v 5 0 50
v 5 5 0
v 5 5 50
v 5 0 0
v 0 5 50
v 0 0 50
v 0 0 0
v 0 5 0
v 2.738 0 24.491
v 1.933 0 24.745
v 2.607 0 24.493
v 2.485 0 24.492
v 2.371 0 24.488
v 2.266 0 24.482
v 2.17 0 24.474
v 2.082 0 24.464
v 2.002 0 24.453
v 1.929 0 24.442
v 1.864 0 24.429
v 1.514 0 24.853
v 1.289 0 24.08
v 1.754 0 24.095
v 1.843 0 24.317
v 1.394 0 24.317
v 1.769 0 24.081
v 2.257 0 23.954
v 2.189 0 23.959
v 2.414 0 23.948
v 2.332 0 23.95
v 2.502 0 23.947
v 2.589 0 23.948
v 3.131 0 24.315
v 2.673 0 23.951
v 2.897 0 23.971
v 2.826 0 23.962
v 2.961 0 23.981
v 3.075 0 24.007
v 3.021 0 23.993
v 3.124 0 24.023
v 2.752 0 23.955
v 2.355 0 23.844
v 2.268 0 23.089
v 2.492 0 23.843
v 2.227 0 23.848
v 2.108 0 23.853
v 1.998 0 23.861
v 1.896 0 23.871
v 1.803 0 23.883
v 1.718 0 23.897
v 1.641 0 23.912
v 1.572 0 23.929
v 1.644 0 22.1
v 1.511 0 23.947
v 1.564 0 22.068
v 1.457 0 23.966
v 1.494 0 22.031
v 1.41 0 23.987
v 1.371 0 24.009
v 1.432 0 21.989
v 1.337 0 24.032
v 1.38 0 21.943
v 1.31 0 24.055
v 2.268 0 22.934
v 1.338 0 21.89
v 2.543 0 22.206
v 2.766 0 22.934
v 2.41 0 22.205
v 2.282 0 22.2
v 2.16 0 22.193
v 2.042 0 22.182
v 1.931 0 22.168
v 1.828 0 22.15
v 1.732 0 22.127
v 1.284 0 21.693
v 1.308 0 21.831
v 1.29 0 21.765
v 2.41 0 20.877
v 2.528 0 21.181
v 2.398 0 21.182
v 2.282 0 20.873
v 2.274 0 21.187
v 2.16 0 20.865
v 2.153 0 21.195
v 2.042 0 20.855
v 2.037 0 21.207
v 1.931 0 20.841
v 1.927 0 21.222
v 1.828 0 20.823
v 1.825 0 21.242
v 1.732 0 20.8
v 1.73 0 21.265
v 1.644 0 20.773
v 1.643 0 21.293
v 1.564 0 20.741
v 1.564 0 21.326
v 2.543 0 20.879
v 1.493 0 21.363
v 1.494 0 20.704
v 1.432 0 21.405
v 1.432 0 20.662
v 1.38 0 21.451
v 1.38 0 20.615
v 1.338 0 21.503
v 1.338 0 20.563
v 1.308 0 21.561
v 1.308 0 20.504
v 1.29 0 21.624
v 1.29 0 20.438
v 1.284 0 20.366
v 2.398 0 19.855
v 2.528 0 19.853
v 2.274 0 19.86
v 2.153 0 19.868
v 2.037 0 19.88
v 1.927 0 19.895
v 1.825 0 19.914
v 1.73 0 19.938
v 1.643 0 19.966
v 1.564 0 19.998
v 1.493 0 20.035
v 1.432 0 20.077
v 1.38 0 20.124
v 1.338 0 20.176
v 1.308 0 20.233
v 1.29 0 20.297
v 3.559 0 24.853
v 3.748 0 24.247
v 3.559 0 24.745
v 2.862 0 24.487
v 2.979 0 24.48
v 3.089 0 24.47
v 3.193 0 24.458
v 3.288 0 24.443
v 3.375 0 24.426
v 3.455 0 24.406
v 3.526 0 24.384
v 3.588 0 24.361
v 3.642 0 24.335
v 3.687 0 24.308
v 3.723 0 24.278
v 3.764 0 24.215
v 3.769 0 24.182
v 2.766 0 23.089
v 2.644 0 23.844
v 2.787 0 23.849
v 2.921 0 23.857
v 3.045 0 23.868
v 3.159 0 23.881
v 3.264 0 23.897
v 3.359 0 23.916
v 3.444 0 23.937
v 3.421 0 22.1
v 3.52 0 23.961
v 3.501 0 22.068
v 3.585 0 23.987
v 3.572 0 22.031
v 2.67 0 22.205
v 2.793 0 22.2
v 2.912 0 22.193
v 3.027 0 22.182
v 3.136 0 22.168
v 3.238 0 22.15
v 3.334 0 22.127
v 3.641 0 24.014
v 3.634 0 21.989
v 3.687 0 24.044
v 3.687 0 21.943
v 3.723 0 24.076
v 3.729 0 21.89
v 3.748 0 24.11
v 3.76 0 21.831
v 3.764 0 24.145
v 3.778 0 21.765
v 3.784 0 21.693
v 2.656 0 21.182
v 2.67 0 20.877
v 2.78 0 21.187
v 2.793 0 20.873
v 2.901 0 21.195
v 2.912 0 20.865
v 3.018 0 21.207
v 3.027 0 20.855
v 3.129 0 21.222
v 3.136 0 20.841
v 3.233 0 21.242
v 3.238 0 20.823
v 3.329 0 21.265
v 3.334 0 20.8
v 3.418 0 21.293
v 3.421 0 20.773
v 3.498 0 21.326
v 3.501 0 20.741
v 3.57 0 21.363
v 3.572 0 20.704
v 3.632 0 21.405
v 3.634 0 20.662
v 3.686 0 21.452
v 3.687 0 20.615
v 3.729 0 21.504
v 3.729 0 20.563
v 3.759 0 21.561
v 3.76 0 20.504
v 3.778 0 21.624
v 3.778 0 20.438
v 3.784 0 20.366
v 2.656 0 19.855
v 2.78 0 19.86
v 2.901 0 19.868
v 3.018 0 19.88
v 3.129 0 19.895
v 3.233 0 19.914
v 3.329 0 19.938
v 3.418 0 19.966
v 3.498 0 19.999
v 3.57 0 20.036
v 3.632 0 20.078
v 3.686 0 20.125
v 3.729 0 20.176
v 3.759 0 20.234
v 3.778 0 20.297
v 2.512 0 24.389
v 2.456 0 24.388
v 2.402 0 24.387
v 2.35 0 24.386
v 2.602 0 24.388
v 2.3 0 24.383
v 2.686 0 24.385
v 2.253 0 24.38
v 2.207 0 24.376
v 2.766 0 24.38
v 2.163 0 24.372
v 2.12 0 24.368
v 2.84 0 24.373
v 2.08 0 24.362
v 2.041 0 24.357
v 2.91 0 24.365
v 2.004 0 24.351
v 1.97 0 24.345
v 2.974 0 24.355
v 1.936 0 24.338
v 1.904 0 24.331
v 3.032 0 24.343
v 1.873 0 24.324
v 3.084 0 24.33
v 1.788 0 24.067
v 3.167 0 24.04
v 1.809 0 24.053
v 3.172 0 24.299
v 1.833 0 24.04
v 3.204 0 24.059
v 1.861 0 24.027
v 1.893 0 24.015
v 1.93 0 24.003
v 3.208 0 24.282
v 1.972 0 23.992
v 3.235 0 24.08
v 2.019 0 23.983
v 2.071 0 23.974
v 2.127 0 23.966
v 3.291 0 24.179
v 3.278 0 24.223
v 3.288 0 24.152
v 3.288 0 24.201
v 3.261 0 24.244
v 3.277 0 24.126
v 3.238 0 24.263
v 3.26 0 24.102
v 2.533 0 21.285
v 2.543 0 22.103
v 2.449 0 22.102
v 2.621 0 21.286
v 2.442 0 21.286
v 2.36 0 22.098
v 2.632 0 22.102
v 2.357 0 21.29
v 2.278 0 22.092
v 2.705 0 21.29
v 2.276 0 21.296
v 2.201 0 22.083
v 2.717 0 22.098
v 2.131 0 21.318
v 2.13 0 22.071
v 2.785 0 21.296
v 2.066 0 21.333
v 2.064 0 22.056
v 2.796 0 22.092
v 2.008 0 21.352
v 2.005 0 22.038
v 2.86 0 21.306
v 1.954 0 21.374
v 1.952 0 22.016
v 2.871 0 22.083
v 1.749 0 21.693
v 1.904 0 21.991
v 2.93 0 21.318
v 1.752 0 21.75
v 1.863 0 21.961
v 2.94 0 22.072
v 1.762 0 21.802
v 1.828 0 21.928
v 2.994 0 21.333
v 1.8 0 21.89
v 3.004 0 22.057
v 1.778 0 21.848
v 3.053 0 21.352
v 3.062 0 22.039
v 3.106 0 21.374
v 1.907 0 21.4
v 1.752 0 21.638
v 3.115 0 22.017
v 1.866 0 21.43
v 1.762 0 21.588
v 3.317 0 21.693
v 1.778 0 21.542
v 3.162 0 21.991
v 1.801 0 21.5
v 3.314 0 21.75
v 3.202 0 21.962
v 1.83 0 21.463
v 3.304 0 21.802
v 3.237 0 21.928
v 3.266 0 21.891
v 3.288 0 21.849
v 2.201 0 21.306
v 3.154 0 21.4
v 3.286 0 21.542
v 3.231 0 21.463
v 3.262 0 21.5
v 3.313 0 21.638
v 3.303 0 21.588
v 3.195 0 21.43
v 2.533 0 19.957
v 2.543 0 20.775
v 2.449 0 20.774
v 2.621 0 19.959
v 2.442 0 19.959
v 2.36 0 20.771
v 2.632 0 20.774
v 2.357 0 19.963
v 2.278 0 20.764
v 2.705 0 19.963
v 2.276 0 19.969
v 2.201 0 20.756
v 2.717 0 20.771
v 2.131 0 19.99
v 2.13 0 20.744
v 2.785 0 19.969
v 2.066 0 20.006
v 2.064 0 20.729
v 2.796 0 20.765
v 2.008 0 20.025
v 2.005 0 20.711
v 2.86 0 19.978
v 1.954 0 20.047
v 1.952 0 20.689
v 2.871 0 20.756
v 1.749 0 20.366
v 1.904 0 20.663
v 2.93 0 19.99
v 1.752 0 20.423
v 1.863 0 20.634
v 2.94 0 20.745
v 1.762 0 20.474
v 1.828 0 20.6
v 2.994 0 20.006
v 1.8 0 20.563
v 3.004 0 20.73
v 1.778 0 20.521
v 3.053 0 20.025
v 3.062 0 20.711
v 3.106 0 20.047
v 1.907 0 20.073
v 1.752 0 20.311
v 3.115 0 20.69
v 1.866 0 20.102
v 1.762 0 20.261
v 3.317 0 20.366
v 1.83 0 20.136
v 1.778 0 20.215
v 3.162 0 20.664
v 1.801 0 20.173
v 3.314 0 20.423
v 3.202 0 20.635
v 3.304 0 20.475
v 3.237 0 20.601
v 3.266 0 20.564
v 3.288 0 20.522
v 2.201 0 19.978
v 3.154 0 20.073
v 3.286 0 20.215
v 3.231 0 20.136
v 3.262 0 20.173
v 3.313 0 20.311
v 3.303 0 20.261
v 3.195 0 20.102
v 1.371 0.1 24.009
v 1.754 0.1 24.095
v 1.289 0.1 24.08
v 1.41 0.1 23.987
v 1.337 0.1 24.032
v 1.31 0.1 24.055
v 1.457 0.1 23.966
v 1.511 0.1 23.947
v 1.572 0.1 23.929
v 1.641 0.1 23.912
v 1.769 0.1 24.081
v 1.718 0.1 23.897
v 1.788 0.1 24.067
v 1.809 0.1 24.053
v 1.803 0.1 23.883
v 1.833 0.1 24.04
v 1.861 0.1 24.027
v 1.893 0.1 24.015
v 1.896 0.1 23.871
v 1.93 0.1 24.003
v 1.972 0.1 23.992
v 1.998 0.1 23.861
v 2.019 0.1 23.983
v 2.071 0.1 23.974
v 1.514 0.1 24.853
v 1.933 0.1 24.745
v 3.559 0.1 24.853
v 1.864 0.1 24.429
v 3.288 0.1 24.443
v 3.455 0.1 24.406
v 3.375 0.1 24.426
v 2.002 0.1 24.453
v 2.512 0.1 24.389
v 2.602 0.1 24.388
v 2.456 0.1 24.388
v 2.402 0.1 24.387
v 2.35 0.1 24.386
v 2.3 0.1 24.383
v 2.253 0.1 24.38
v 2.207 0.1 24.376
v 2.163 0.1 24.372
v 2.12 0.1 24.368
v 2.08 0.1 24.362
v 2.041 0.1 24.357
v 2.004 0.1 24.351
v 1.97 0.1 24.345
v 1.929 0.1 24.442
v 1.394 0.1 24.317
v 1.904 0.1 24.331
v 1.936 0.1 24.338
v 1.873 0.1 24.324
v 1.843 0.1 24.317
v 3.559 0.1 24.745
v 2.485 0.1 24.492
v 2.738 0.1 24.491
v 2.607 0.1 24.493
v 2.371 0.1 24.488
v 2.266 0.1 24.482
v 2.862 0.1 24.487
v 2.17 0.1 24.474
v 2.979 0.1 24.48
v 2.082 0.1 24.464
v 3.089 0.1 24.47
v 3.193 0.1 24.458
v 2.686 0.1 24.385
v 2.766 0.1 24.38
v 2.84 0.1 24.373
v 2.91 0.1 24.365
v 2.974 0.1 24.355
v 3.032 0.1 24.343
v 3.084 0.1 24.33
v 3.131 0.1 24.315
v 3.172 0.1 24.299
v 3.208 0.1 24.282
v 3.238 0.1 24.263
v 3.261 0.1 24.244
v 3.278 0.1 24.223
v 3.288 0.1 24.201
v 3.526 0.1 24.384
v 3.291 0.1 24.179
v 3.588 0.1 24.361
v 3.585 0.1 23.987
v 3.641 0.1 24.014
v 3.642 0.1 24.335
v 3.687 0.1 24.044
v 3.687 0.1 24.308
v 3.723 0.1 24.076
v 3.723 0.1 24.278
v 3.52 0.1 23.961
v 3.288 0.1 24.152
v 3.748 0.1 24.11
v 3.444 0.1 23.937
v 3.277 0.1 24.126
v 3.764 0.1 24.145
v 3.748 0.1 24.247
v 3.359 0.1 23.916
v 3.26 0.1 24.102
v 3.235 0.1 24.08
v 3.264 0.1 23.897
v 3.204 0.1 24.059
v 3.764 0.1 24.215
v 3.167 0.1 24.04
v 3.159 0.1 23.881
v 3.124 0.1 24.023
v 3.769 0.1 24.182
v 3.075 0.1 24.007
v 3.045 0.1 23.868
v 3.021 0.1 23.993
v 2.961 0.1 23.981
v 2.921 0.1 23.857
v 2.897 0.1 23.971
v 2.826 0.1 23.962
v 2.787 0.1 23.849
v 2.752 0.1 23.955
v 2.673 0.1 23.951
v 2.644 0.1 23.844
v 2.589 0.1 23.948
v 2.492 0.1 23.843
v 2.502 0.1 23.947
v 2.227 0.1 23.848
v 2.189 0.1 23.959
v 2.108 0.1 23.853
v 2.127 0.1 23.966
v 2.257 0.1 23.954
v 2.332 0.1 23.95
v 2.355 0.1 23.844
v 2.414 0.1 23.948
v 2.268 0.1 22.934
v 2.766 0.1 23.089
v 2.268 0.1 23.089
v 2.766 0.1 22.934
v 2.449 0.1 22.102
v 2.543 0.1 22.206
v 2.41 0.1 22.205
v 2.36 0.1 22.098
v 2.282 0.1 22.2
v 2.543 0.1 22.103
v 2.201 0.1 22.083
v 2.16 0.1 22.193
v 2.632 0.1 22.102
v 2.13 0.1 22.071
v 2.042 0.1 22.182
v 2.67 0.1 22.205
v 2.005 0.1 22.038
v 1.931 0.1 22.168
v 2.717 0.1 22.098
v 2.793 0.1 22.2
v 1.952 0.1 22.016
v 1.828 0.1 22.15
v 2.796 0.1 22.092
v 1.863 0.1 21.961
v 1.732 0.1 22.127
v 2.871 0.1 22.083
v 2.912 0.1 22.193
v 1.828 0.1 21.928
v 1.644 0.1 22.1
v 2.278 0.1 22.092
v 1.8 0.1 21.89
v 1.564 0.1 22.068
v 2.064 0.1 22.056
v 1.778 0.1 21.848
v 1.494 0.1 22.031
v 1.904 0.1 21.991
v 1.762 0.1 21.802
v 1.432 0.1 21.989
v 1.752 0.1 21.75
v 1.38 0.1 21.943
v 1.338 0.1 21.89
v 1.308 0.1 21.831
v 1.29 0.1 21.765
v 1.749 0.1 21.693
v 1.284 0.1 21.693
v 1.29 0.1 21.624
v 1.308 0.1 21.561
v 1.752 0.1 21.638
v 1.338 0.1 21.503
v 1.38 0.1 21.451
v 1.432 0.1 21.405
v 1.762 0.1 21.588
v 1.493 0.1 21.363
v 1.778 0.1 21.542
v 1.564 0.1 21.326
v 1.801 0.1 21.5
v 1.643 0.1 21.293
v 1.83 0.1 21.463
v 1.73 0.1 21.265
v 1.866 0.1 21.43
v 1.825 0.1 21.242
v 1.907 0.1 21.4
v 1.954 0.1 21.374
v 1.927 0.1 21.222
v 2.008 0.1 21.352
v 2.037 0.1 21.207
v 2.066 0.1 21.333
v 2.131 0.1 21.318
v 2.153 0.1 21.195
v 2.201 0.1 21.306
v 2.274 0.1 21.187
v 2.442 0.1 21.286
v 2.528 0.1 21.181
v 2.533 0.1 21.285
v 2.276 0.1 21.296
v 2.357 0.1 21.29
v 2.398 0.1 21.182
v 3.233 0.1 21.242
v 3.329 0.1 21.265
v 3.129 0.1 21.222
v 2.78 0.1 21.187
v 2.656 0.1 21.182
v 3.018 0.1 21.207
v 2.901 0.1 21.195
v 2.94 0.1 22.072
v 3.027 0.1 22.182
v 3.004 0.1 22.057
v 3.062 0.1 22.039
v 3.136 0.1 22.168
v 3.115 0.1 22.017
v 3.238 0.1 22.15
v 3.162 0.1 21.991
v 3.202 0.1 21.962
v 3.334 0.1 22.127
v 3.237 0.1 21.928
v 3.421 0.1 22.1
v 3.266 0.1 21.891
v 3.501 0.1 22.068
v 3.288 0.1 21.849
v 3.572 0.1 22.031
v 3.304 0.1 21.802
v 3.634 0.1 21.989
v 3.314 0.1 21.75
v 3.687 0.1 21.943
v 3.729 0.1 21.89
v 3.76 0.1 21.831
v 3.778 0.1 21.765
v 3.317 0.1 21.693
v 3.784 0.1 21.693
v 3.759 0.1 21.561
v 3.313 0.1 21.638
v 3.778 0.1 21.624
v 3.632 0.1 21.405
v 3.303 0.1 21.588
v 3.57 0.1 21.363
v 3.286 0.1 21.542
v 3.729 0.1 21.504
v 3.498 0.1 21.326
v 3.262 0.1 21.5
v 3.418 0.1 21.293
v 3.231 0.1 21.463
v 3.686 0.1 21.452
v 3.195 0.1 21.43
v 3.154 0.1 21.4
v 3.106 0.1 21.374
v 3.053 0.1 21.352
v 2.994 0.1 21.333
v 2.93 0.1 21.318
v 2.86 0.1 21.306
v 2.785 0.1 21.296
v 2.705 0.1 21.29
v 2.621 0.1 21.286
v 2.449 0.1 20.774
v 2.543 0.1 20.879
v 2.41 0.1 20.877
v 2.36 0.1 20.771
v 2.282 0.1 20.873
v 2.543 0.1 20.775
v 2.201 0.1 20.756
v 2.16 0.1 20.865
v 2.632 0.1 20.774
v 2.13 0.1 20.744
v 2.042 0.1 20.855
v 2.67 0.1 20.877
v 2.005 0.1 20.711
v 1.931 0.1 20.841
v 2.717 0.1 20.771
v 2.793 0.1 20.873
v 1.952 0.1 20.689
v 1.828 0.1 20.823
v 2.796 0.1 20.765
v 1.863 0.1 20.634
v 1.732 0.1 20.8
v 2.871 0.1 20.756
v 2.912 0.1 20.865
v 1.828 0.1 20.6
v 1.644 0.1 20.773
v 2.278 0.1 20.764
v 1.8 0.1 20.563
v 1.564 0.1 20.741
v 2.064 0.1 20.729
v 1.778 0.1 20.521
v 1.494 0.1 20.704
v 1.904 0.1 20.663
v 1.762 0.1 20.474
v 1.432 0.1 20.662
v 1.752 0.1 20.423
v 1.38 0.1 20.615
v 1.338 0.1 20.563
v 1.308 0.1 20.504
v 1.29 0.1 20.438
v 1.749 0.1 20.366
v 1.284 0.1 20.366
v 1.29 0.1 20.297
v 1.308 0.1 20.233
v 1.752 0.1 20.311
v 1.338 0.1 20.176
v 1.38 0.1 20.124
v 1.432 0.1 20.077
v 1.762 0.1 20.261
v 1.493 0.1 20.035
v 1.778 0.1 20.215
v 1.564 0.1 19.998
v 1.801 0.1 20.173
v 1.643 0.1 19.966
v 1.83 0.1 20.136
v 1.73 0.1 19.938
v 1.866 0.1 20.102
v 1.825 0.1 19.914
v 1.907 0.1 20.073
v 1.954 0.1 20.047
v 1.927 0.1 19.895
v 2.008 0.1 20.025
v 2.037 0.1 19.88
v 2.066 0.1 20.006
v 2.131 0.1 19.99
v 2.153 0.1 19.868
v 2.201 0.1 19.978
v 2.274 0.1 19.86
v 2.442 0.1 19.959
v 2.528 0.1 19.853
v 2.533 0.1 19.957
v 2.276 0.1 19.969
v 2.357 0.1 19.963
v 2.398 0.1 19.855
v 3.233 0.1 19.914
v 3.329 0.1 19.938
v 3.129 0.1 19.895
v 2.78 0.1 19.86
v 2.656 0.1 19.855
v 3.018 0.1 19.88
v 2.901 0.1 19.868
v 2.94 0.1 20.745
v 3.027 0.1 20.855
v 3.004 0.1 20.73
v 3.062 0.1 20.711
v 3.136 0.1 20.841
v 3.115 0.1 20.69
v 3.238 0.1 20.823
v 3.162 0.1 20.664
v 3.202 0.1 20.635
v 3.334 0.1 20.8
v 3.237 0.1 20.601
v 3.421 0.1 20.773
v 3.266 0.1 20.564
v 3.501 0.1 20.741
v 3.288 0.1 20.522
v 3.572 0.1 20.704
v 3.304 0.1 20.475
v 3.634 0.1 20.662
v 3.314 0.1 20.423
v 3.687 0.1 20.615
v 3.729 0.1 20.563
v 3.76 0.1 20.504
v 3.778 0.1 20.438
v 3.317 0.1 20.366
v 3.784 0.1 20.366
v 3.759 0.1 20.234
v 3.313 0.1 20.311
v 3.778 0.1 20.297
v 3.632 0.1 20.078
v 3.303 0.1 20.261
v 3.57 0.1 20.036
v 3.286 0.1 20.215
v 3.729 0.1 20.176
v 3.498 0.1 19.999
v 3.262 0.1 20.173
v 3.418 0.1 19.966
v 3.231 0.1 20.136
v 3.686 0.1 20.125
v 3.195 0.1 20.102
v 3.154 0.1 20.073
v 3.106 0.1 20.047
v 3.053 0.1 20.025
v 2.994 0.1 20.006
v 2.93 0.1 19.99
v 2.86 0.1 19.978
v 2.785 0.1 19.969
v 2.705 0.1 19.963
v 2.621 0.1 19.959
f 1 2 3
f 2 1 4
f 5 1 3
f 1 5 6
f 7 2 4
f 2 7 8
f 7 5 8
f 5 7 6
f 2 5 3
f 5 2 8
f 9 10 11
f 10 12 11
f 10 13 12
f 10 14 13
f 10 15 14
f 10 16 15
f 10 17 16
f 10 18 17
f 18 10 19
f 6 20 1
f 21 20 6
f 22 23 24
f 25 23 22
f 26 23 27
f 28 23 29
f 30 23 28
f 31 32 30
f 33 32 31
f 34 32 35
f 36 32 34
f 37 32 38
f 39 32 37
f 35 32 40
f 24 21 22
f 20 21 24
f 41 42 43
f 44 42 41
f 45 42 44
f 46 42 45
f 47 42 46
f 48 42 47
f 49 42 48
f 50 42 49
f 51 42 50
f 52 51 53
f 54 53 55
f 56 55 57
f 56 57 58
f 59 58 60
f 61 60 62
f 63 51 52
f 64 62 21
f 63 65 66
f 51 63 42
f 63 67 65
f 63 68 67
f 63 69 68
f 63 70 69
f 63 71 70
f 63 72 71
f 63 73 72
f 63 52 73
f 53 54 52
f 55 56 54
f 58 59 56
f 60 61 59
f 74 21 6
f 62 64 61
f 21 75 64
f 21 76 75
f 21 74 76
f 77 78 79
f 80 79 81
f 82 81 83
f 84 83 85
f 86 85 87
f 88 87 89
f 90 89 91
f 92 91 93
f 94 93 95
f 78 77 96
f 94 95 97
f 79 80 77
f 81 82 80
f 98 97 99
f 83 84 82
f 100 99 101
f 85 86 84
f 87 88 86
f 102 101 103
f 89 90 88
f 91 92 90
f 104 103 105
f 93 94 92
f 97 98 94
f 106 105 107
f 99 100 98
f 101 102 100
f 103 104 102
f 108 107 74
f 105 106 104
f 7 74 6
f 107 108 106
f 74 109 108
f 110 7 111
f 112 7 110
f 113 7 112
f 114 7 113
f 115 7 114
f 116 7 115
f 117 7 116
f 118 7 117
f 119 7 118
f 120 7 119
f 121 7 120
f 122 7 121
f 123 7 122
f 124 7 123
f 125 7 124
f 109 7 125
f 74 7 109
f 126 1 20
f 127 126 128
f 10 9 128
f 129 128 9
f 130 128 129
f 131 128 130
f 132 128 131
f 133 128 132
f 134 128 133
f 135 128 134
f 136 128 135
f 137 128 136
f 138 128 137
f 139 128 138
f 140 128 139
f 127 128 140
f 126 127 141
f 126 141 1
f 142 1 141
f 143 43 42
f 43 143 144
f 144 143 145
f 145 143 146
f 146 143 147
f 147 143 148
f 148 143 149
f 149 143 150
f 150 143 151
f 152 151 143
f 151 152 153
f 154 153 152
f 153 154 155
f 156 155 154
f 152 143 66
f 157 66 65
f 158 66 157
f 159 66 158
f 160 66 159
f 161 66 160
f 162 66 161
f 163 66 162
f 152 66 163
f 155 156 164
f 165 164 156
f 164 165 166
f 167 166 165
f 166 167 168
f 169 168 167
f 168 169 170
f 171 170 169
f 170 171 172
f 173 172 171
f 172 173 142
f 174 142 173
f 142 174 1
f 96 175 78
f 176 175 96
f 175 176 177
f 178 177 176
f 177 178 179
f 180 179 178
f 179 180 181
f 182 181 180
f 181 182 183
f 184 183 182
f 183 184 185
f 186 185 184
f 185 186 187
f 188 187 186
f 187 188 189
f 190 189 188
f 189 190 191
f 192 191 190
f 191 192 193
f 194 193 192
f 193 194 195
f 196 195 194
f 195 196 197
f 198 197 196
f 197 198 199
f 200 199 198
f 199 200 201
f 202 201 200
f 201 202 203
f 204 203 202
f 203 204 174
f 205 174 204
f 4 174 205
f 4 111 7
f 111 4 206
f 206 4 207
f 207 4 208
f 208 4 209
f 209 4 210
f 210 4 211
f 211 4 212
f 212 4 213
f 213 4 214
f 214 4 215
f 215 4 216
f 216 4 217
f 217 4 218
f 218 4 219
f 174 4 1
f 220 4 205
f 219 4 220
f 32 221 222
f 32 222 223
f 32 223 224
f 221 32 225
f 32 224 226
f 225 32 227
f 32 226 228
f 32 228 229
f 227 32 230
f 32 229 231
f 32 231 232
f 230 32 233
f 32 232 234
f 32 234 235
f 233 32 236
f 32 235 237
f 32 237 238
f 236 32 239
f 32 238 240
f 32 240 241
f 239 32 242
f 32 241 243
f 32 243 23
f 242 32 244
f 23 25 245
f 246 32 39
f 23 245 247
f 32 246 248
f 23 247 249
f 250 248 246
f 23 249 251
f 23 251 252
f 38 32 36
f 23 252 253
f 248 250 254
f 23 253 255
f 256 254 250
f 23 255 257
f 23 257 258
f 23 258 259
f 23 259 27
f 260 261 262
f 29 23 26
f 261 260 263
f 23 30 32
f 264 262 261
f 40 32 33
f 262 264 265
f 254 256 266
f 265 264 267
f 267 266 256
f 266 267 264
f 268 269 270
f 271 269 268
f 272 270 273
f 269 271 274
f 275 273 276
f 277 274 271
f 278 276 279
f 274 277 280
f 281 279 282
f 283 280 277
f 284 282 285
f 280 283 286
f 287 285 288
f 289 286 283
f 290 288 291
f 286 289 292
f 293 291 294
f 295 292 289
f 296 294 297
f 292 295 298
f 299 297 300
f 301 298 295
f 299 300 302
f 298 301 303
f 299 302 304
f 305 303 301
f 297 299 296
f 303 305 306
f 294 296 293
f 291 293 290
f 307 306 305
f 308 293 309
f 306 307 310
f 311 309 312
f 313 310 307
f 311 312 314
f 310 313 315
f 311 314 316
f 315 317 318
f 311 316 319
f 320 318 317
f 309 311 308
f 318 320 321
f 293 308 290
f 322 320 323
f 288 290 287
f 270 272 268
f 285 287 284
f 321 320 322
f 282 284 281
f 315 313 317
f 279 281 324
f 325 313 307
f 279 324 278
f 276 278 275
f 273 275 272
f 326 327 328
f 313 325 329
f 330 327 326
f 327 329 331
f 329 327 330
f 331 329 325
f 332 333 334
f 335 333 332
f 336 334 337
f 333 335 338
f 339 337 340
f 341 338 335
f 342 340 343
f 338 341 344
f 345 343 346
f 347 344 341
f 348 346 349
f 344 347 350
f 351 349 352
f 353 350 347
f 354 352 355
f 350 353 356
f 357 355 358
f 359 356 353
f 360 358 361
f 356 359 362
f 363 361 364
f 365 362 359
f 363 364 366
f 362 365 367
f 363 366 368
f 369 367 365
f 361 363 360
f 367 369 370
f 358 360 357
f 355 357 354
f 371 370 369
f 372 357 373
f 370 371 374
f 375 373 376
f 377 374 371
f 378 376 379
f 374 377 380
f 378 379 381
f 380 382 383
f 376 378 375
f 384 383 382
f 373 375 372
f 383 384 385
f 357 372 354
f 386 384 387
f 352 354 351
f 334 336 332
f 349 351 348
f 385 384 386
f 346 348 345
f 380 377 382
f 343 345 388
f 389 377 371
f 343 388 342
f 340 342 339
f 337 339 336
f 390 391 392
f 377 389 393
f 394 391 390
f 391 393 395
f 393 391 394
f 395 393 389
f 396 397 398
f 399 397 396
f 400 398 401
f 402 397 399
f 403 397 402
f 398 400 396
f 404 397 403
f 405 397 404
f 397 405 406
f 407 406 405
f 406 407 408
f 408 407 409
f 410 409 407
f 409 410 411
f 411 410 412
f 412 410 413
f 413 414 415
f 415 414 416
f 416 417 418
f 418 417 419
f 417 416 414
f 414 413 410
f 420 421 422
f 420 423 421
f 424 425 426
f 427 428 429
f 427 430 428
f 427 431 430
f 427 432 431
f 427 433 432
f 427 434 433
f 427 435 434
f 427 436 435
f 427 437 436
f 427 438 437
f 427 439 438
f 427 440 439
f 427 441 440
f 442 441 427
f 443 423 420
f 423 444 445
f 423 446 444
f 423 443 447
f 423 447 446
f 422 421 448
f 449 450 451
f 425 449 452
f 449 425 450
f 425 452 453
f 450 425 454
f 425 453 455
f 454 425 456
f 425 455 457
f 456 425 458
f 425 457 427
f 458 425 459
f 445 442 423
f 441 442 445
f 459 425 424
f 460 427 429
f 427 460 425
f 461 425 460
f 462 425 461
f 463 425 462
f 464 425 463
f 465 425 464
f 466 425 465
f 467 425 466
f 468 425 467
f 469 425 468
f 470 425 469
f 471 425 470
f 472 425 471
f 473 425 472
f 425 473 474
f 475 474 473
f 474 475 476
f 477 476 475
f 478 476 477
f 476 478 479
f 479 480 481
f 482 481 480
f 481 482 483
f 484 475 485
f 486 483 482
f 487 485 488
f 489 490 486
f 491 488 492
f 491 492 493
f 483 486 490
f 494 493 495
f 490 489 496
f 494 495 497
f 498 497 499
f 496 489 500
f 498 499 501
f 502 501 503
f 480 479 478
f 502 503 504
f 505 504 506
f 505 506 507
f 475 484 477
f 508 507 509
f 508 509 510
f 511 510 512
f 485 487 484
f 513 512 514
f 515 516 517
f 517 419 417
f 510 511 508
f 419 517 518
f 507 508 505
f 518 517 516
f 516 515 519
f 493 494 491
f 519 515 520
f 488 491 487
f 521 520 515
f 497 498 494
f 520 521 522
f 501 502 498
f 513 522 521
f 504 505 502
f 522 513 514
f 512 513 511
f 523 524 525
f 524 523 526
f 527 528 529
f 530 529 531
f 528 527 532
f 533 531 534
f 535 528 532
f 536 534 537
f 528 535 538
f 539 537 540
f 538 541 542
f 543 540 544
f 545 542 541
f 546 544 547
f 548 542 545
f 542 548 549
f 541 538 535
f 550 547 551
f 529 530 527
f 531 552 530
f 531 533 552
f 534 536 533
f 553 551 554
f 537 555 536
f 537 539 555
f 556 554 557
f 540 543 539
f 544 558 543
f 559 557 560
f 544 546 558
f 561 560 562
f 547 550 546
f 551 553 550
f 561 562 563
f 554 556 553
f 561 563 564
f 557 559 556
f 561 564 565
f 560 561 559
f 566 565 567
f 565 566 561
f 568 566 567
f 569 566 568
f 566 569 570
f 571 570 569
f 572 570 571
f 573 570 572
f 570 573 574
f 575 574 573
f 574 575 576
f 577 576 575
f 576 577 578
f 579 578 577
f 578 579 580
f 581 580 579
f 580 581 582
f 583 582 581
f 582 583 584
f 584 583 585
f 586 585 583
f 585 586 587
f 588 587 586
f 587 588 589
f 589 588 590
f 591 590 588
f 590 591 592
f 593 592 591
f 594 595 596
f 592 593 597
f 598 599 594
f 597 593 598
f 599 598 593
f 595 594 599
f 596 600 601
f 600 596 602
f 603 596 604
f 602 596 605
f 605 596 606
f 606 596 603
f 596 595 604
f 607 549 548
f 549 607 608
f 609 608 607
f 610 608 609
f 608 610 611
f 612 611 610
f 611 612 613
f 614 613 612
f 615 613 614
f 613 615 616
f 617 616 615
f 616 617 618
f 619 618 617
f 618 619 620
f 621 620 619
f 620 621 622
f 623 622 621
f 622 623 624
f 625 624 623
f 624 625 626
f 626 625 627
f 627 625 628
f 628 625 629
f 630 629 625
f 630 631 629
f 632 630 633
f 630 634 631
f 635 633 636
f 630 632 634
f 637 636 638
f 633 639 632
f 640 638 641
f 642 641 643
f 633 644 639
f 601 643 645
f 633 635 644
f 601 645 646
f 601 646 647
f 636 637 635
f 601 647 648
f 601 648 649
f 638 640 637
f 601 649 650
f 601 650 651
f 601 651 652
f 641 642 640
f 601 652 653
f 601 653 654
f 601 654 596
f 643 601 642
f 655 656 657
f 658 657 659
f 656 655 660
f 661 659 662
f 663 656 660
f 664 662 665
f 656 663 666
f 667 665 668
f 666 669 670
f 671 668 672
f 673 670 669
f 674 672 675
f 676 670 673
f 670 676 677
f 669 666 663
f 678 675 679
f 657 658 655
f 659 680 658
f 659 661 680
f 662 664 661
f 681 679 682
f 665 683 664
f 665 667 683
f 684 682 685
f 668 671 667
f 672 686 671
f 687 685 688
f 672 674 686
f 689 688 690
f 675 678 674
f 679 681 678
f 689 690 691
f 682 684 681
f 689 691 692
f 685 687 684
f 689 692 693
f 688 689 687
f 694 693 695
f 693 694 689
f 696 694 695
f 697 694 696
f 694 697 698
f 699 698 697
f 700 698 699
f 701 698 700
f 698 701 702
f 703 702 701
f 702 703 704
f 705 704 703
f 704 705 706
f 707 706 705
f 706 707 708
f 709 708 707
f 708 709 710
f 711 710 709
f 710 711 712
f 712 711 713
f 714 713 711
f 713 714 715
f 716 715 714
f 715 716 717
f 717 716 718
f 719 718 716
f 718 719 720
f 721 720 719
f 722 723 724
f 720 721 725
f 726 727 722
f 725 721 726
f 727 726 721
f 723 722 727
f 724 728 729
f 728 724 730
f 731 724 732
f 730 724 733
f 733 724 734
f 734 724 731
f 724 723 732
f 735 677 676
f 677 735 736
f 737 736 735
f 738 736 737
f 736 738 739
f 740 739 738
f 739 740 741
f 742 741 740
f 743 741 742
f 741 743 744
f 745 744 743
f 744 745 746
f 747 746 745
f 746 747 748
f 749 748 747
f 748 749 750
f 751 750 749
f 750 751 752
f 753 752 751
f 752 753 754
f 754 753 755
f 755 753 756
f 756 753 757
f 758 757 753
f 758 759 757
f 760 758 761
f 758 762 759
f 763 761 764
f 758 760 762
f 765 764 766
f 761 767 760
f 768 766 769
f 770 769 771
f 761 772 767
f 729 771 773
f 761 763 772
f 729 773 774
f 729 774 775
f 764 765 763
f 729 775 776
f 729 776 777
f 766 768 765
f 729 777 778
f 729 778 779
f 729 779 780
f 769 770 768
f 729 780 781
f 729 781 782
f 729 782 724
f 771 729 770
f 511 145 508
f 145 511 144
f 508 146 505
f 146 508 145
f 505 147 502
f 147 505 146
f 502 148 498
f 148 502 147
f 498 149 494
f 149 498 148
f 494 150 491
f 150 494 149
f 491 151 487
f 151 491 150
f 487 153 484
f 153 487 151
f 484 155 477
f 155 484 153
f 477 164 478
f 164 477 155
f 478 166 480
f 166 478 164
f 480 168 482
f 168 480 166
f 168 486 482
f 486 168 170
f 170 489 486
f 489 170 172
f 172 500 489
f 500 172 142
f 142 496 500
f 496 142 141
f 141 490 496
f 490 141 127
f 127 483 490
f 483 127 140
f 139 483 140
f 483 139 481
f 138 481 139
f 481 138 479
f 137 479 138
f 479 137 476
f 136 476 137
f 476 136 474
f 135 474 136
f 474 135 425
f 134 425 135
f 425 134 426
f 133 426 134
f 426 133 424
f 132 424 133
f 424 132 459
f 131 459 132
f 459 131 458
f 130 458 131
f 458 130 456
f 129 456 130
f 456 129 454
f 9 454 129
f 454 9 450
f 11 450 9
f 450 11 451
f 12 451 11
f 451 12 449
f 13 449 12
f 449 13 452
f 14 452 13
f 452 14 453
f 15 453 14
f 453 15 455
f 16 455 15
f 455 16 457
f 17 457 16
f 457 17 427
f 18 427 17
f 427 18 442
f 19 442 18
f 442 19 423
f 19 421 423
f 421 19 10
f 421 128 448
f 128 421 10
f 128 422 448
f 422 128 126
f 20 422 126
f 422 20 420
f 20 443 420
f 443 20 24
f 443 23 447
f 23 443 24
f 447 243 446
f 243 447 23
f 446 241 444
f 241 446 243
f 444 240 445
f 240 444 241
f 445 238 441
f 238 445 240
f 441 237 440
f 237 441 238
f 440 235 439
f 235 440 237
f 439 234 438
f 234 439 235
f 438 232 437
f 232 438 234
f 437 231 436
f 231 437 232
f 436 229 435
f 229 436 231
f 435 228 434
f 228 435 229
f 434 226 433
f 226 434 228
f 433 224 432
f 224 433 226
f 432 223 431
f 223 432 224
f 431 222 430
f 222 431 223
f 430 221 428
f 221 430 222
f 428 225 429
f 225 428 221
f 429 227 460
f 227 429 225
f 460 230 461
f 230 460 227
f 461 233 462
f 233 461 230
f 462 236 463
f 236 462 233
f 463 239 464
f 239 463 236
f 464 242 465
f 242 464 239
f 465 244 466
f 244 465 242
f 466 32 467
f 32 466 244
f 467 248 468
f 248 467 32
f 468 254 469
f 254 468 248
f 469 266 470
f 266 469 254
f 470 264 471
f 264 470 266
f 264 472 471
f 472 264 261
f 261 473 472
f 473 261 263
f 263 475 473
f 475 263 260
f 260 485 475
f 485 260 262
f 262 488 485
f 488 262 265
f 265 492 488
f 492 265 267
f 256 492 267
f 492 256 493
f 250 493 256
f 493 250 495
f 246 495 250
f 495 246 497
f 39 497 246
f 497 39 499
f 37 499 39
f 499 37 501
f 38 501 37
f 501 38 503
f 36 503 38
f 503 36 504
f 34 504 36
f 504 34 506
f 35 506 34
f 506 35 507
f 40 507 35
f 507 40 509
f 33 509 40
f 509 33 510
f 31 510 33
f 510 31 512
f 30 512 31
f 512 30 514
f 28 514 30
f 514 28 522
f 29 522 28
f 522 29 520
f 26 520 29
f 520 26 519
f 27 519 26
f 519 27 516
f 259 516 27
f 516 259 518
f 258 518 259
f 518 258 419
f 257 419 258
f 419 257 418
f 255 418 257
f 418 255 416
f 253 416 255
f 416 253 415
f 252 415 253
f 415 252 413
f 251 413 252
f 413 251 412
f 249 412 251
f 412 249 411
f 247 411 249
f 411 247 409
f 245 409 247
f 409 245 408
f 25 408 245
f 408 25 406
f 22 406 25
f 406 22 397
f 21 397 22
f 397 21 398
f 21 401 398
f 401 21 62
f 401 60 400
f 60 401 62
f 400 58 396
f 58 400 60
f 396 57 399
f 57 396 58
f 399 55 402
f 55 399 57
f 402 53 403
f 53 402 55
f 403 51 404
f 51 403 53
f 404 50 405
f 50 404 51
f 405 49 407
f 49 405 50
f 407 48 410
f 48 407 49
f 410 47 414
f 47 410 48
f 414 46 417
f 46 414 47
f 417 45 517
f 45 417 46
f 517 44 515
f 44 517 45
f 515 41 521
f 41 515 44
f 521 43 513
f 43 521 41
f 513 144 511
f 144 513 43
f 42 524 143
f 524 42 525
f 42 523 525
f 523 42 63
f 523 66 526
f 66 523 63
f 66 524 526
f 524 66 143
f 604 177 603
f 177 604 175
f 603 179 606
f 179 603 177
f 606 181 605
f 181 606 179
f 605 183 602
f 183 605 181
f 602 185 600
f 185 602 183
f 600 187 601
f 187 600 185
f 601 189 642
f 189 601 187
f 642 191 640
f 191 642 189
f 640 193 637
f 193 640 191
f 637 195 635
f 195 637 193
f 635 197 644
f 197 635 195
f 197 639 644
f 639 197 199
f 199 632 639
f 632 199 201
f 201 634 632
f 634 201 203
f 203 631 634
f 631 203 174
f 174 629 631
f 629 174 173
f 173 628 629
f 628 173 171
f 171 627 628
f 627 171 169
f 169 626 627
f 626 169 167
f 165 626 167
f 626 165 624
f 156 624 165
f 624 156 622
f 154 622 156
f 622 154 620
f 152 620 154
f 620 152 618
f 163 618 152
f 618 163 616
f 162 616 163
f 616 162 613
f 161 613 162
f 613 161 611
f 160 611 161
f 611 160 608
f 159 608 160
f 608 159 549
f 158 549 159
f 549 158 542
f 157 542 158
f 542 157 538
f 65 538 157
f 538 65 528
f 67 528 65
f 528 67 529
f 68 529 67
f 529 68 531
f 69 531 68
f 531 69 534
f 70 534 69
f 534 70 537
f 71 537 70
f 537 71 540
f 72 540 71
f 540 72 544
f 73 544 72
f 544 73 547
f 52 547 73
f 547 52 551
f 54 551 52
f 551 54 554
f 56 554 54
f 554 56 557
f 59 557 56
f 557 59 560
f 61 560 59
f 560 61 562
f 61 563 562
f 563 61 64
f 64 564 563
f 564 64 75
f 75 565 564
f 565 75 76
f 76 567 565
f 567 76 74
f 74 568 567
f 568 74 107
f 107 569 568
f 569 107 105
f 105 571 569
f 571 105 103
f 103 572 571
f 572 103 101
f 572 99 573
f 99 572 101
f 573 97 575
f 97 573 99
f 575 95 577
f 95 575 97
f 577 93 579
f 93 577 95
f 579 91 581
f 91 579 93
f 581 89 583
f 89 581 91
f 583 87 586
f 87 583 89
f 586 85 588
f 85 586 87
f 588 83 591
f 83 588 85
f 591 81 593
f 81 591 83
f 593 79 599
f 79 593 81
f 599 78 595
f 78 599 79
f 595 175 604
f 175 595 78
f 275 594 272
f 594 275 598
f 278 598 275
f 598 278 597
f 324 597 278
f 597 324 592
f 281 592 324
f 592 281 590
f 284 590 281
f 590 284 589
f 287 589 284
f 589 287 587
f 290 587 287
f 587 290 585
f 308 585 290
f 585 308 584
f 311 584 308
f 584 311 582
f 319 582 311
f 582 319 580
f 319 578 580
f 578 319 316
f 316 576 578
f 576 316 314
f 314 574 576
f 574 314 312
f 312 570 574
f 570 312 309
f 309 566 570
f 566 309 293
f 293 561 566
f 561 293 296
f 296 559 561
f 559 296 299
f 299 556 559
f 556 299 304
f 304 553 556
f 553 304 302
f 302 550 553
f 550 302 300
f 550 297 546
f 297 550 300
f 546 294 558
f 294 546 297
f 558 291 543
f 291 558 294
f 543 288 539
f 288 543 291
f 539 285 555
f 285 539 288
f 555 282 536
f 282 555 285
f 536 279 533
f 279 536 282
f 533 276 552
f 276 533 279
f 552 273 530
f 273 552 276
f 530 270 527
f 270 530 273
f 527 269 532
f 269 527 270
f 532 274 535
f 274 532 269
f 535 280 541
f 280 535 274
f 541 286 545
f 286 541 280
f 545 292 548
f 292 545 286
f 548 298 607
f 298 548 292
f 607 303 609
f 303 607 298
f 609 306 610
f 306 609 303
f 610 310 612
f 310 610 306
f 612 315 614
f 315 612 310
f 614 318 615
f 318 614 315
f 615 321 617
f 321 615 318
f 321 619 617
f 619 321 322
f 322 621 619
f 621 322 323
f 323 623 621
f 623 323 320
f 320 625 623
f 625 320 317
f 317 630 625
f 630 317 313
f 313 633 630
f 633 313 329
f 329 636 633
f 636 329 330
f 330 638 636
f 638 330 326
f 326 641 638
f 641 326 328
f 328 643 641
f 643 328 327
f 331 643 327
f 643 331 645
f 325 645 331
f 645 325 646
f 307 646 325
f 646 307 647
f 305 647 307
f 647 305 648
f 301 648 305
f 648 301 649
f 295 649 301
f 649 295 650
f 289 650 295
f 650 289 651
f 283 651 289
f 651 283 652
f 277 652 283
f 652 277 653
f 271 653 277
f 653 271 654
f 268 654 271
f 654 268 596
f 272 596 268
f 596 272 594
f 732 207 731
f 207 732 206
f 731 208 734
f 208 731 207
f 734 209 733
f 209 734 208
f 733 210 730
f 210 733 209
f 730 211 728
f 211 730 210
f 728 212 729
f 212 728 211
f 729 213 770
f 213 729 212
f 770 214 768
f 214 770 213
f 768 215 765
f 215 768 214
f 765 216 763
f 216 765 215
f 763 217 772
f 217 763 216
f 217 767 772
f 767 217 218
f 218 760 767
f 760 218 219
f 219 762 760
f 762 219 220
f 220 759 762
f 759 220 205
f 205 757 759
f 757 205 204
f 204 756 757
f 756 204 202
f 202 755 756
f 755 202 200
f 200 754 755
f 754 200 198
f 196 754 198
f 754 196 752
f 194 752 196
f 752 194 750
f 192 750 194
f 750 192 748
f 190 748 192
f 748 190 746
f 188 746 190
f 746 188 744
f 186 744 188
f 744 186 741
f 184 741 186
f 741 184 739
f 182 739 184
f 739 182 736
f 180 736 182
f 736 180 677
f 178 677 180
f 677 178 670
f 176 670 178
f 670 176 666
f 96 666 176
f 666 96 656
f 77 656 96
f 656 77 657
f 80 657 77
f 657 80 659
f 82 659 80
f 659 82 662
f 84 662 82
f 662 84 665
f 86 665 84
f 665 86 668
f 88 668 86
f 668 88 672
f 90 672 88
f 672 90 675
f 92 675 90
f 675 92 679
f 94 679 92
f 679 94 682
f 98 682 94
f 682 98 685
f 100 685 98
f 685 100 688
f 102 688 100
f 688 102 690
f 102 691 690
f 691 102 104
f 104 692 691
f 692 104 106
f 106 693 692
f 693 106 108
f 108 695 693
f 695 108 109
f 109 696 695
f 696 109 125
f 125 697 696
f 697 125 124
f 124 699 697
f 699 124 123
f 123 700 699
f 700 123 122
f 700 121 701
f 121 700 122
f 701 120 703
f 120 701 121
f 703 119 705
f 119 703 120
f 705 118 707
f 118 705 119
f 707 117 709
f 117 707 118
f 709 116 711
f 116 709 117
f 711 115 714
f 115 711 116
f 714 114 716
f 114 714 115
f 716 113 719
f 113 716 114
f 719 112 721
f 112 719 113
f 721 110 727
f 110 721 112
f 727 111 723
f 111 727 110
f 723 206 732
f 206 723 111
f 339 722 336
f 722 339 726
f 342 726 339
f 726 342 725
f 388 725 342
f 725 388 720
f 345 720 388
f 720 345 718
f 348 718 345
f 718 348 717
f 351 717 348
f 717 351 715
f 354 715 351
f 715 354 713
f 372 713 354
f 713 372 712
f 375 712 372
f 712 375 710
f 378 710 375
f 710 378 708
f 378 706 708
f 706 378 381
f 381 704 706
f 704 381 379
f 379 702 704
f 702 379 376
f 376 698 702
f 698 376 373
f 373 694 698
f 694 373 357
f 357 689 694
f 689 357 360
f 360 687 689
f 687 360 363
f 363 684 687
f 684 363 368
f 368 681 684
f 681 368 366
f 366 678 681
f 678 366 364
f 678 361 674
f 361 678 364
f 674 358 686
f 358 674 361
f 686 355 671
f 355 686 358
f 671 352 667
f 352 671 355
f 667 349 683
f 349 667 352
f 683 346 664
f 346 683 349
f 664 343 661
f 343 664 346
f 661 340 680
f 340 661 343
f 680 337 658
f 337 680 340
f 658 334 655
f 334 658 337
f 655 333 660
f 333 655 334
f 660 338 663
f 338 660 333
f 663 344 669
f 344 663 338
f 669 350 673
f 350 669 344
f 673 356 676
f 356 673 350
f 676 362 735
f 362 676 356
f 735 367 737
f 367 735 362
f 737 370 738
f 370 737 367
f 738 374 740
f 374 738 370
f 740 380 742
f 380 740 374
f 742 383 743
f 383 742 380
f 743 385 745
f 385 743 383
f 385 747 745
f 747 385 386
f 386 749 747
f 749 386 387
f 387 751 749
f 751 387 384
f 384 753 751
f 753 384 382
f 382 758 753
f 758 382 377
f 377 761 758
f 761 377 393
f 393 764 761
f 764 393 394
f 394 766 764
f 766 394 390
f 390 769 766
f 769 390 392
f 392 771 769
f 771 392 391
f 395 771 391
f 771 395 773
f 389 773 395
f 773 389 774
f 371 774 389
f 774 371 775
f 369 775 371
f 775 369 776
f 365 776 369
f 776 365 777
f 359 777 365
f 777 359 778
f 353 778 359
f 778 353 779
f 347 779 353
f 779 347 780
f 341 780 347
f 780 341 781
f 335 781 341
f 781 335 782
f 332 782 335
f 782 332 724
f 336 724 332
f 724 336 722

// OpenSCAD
difference() {
	cube(size = [5.0, 5.0, 50.0]);
	translate(v = [2.5, 0.1, 25.0]) {
		resize(newsize = [2.5, 0, 5.0]) {
			rotate(a = [90, 0, 0]) {
				linear_extrude(height = 1.0) {
					text(direction = "ttb", size = 10, text = "5.00");
				}
			}
		}
	}
}
